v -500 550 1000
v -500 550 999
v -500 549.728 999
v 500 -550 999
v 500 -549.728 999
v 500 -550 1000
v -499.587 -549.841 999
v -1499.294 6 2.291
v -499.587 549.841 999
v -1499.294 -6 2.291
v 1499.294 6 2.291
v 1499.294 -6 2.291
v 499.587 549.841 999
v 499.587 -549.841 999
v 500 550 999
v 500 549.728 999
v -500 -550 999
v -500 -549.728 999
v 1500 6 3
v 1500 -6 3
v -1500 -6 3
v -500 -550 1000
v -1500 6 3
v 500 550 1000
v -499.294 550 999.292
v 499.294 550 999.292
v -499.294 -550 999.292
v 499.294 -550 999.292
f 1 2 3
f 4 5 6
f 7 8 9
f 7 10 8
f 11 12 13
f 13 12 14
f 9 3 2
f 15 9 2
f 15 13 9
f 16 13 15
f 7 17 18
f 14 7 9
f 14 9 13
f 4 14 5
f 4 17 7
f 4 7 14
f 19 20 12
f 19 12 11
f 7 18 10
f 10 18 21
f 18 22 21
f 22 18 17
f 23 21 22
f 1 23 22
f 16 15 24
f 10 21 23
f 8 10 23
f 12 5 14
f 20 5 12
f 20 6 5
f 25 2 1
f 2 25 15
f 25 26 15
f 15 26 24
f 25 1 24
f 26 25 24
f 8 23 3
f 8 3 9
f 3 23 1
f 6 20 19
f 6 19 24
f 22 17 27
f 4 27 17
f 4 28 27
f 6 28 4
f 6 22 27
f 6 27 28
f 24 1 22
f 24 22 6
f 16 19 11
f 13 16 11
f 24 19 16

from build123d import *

# Parameters (mm, degrees)
SKETCH001_W             = 1000
SKETCH001_H             = 1100
PAD001_DEPTH            = 1
PAD002_DEPTH            = 1
BODY001_PLACEMENT_ANGLE = 180


with BuildPart() as part:
    # Sketch001 → Pad001 (new body)
    with BuildSketch(Plane.XY):
        Rectangle(SKETCH001_W, SKETCH001_H)
    extrude(amount=PAD001_DEPTH)

    # Sketch002 (on Local_CS) → Pad002 (join)
    with BuildSketch(Plane(origin=(-500, 0, 0), x_dir=(0.708168, 0, -0.706044), z_dir=(0.706044, 0, 0.708168))):
        Polygon((0, -550), (0, 550), (-1412.093835, 6), (-1412.093835, -6), align=None)
    pad002 = extrude(amount=PAD002_DEPTH)

    # Mirrored: Pad002 across YZ
    add(pad002.mirror(Plane.YZ))


with BuildPart() as part_1:
    # Body001 placement: moved
    add(part.part.moved(Location((0, 0, 1000))).rotate(Axis((0, 0, 1000), (1, 0, 0)), BODY001_PLACEMENT_ANGLE))


solid = part_1.part
